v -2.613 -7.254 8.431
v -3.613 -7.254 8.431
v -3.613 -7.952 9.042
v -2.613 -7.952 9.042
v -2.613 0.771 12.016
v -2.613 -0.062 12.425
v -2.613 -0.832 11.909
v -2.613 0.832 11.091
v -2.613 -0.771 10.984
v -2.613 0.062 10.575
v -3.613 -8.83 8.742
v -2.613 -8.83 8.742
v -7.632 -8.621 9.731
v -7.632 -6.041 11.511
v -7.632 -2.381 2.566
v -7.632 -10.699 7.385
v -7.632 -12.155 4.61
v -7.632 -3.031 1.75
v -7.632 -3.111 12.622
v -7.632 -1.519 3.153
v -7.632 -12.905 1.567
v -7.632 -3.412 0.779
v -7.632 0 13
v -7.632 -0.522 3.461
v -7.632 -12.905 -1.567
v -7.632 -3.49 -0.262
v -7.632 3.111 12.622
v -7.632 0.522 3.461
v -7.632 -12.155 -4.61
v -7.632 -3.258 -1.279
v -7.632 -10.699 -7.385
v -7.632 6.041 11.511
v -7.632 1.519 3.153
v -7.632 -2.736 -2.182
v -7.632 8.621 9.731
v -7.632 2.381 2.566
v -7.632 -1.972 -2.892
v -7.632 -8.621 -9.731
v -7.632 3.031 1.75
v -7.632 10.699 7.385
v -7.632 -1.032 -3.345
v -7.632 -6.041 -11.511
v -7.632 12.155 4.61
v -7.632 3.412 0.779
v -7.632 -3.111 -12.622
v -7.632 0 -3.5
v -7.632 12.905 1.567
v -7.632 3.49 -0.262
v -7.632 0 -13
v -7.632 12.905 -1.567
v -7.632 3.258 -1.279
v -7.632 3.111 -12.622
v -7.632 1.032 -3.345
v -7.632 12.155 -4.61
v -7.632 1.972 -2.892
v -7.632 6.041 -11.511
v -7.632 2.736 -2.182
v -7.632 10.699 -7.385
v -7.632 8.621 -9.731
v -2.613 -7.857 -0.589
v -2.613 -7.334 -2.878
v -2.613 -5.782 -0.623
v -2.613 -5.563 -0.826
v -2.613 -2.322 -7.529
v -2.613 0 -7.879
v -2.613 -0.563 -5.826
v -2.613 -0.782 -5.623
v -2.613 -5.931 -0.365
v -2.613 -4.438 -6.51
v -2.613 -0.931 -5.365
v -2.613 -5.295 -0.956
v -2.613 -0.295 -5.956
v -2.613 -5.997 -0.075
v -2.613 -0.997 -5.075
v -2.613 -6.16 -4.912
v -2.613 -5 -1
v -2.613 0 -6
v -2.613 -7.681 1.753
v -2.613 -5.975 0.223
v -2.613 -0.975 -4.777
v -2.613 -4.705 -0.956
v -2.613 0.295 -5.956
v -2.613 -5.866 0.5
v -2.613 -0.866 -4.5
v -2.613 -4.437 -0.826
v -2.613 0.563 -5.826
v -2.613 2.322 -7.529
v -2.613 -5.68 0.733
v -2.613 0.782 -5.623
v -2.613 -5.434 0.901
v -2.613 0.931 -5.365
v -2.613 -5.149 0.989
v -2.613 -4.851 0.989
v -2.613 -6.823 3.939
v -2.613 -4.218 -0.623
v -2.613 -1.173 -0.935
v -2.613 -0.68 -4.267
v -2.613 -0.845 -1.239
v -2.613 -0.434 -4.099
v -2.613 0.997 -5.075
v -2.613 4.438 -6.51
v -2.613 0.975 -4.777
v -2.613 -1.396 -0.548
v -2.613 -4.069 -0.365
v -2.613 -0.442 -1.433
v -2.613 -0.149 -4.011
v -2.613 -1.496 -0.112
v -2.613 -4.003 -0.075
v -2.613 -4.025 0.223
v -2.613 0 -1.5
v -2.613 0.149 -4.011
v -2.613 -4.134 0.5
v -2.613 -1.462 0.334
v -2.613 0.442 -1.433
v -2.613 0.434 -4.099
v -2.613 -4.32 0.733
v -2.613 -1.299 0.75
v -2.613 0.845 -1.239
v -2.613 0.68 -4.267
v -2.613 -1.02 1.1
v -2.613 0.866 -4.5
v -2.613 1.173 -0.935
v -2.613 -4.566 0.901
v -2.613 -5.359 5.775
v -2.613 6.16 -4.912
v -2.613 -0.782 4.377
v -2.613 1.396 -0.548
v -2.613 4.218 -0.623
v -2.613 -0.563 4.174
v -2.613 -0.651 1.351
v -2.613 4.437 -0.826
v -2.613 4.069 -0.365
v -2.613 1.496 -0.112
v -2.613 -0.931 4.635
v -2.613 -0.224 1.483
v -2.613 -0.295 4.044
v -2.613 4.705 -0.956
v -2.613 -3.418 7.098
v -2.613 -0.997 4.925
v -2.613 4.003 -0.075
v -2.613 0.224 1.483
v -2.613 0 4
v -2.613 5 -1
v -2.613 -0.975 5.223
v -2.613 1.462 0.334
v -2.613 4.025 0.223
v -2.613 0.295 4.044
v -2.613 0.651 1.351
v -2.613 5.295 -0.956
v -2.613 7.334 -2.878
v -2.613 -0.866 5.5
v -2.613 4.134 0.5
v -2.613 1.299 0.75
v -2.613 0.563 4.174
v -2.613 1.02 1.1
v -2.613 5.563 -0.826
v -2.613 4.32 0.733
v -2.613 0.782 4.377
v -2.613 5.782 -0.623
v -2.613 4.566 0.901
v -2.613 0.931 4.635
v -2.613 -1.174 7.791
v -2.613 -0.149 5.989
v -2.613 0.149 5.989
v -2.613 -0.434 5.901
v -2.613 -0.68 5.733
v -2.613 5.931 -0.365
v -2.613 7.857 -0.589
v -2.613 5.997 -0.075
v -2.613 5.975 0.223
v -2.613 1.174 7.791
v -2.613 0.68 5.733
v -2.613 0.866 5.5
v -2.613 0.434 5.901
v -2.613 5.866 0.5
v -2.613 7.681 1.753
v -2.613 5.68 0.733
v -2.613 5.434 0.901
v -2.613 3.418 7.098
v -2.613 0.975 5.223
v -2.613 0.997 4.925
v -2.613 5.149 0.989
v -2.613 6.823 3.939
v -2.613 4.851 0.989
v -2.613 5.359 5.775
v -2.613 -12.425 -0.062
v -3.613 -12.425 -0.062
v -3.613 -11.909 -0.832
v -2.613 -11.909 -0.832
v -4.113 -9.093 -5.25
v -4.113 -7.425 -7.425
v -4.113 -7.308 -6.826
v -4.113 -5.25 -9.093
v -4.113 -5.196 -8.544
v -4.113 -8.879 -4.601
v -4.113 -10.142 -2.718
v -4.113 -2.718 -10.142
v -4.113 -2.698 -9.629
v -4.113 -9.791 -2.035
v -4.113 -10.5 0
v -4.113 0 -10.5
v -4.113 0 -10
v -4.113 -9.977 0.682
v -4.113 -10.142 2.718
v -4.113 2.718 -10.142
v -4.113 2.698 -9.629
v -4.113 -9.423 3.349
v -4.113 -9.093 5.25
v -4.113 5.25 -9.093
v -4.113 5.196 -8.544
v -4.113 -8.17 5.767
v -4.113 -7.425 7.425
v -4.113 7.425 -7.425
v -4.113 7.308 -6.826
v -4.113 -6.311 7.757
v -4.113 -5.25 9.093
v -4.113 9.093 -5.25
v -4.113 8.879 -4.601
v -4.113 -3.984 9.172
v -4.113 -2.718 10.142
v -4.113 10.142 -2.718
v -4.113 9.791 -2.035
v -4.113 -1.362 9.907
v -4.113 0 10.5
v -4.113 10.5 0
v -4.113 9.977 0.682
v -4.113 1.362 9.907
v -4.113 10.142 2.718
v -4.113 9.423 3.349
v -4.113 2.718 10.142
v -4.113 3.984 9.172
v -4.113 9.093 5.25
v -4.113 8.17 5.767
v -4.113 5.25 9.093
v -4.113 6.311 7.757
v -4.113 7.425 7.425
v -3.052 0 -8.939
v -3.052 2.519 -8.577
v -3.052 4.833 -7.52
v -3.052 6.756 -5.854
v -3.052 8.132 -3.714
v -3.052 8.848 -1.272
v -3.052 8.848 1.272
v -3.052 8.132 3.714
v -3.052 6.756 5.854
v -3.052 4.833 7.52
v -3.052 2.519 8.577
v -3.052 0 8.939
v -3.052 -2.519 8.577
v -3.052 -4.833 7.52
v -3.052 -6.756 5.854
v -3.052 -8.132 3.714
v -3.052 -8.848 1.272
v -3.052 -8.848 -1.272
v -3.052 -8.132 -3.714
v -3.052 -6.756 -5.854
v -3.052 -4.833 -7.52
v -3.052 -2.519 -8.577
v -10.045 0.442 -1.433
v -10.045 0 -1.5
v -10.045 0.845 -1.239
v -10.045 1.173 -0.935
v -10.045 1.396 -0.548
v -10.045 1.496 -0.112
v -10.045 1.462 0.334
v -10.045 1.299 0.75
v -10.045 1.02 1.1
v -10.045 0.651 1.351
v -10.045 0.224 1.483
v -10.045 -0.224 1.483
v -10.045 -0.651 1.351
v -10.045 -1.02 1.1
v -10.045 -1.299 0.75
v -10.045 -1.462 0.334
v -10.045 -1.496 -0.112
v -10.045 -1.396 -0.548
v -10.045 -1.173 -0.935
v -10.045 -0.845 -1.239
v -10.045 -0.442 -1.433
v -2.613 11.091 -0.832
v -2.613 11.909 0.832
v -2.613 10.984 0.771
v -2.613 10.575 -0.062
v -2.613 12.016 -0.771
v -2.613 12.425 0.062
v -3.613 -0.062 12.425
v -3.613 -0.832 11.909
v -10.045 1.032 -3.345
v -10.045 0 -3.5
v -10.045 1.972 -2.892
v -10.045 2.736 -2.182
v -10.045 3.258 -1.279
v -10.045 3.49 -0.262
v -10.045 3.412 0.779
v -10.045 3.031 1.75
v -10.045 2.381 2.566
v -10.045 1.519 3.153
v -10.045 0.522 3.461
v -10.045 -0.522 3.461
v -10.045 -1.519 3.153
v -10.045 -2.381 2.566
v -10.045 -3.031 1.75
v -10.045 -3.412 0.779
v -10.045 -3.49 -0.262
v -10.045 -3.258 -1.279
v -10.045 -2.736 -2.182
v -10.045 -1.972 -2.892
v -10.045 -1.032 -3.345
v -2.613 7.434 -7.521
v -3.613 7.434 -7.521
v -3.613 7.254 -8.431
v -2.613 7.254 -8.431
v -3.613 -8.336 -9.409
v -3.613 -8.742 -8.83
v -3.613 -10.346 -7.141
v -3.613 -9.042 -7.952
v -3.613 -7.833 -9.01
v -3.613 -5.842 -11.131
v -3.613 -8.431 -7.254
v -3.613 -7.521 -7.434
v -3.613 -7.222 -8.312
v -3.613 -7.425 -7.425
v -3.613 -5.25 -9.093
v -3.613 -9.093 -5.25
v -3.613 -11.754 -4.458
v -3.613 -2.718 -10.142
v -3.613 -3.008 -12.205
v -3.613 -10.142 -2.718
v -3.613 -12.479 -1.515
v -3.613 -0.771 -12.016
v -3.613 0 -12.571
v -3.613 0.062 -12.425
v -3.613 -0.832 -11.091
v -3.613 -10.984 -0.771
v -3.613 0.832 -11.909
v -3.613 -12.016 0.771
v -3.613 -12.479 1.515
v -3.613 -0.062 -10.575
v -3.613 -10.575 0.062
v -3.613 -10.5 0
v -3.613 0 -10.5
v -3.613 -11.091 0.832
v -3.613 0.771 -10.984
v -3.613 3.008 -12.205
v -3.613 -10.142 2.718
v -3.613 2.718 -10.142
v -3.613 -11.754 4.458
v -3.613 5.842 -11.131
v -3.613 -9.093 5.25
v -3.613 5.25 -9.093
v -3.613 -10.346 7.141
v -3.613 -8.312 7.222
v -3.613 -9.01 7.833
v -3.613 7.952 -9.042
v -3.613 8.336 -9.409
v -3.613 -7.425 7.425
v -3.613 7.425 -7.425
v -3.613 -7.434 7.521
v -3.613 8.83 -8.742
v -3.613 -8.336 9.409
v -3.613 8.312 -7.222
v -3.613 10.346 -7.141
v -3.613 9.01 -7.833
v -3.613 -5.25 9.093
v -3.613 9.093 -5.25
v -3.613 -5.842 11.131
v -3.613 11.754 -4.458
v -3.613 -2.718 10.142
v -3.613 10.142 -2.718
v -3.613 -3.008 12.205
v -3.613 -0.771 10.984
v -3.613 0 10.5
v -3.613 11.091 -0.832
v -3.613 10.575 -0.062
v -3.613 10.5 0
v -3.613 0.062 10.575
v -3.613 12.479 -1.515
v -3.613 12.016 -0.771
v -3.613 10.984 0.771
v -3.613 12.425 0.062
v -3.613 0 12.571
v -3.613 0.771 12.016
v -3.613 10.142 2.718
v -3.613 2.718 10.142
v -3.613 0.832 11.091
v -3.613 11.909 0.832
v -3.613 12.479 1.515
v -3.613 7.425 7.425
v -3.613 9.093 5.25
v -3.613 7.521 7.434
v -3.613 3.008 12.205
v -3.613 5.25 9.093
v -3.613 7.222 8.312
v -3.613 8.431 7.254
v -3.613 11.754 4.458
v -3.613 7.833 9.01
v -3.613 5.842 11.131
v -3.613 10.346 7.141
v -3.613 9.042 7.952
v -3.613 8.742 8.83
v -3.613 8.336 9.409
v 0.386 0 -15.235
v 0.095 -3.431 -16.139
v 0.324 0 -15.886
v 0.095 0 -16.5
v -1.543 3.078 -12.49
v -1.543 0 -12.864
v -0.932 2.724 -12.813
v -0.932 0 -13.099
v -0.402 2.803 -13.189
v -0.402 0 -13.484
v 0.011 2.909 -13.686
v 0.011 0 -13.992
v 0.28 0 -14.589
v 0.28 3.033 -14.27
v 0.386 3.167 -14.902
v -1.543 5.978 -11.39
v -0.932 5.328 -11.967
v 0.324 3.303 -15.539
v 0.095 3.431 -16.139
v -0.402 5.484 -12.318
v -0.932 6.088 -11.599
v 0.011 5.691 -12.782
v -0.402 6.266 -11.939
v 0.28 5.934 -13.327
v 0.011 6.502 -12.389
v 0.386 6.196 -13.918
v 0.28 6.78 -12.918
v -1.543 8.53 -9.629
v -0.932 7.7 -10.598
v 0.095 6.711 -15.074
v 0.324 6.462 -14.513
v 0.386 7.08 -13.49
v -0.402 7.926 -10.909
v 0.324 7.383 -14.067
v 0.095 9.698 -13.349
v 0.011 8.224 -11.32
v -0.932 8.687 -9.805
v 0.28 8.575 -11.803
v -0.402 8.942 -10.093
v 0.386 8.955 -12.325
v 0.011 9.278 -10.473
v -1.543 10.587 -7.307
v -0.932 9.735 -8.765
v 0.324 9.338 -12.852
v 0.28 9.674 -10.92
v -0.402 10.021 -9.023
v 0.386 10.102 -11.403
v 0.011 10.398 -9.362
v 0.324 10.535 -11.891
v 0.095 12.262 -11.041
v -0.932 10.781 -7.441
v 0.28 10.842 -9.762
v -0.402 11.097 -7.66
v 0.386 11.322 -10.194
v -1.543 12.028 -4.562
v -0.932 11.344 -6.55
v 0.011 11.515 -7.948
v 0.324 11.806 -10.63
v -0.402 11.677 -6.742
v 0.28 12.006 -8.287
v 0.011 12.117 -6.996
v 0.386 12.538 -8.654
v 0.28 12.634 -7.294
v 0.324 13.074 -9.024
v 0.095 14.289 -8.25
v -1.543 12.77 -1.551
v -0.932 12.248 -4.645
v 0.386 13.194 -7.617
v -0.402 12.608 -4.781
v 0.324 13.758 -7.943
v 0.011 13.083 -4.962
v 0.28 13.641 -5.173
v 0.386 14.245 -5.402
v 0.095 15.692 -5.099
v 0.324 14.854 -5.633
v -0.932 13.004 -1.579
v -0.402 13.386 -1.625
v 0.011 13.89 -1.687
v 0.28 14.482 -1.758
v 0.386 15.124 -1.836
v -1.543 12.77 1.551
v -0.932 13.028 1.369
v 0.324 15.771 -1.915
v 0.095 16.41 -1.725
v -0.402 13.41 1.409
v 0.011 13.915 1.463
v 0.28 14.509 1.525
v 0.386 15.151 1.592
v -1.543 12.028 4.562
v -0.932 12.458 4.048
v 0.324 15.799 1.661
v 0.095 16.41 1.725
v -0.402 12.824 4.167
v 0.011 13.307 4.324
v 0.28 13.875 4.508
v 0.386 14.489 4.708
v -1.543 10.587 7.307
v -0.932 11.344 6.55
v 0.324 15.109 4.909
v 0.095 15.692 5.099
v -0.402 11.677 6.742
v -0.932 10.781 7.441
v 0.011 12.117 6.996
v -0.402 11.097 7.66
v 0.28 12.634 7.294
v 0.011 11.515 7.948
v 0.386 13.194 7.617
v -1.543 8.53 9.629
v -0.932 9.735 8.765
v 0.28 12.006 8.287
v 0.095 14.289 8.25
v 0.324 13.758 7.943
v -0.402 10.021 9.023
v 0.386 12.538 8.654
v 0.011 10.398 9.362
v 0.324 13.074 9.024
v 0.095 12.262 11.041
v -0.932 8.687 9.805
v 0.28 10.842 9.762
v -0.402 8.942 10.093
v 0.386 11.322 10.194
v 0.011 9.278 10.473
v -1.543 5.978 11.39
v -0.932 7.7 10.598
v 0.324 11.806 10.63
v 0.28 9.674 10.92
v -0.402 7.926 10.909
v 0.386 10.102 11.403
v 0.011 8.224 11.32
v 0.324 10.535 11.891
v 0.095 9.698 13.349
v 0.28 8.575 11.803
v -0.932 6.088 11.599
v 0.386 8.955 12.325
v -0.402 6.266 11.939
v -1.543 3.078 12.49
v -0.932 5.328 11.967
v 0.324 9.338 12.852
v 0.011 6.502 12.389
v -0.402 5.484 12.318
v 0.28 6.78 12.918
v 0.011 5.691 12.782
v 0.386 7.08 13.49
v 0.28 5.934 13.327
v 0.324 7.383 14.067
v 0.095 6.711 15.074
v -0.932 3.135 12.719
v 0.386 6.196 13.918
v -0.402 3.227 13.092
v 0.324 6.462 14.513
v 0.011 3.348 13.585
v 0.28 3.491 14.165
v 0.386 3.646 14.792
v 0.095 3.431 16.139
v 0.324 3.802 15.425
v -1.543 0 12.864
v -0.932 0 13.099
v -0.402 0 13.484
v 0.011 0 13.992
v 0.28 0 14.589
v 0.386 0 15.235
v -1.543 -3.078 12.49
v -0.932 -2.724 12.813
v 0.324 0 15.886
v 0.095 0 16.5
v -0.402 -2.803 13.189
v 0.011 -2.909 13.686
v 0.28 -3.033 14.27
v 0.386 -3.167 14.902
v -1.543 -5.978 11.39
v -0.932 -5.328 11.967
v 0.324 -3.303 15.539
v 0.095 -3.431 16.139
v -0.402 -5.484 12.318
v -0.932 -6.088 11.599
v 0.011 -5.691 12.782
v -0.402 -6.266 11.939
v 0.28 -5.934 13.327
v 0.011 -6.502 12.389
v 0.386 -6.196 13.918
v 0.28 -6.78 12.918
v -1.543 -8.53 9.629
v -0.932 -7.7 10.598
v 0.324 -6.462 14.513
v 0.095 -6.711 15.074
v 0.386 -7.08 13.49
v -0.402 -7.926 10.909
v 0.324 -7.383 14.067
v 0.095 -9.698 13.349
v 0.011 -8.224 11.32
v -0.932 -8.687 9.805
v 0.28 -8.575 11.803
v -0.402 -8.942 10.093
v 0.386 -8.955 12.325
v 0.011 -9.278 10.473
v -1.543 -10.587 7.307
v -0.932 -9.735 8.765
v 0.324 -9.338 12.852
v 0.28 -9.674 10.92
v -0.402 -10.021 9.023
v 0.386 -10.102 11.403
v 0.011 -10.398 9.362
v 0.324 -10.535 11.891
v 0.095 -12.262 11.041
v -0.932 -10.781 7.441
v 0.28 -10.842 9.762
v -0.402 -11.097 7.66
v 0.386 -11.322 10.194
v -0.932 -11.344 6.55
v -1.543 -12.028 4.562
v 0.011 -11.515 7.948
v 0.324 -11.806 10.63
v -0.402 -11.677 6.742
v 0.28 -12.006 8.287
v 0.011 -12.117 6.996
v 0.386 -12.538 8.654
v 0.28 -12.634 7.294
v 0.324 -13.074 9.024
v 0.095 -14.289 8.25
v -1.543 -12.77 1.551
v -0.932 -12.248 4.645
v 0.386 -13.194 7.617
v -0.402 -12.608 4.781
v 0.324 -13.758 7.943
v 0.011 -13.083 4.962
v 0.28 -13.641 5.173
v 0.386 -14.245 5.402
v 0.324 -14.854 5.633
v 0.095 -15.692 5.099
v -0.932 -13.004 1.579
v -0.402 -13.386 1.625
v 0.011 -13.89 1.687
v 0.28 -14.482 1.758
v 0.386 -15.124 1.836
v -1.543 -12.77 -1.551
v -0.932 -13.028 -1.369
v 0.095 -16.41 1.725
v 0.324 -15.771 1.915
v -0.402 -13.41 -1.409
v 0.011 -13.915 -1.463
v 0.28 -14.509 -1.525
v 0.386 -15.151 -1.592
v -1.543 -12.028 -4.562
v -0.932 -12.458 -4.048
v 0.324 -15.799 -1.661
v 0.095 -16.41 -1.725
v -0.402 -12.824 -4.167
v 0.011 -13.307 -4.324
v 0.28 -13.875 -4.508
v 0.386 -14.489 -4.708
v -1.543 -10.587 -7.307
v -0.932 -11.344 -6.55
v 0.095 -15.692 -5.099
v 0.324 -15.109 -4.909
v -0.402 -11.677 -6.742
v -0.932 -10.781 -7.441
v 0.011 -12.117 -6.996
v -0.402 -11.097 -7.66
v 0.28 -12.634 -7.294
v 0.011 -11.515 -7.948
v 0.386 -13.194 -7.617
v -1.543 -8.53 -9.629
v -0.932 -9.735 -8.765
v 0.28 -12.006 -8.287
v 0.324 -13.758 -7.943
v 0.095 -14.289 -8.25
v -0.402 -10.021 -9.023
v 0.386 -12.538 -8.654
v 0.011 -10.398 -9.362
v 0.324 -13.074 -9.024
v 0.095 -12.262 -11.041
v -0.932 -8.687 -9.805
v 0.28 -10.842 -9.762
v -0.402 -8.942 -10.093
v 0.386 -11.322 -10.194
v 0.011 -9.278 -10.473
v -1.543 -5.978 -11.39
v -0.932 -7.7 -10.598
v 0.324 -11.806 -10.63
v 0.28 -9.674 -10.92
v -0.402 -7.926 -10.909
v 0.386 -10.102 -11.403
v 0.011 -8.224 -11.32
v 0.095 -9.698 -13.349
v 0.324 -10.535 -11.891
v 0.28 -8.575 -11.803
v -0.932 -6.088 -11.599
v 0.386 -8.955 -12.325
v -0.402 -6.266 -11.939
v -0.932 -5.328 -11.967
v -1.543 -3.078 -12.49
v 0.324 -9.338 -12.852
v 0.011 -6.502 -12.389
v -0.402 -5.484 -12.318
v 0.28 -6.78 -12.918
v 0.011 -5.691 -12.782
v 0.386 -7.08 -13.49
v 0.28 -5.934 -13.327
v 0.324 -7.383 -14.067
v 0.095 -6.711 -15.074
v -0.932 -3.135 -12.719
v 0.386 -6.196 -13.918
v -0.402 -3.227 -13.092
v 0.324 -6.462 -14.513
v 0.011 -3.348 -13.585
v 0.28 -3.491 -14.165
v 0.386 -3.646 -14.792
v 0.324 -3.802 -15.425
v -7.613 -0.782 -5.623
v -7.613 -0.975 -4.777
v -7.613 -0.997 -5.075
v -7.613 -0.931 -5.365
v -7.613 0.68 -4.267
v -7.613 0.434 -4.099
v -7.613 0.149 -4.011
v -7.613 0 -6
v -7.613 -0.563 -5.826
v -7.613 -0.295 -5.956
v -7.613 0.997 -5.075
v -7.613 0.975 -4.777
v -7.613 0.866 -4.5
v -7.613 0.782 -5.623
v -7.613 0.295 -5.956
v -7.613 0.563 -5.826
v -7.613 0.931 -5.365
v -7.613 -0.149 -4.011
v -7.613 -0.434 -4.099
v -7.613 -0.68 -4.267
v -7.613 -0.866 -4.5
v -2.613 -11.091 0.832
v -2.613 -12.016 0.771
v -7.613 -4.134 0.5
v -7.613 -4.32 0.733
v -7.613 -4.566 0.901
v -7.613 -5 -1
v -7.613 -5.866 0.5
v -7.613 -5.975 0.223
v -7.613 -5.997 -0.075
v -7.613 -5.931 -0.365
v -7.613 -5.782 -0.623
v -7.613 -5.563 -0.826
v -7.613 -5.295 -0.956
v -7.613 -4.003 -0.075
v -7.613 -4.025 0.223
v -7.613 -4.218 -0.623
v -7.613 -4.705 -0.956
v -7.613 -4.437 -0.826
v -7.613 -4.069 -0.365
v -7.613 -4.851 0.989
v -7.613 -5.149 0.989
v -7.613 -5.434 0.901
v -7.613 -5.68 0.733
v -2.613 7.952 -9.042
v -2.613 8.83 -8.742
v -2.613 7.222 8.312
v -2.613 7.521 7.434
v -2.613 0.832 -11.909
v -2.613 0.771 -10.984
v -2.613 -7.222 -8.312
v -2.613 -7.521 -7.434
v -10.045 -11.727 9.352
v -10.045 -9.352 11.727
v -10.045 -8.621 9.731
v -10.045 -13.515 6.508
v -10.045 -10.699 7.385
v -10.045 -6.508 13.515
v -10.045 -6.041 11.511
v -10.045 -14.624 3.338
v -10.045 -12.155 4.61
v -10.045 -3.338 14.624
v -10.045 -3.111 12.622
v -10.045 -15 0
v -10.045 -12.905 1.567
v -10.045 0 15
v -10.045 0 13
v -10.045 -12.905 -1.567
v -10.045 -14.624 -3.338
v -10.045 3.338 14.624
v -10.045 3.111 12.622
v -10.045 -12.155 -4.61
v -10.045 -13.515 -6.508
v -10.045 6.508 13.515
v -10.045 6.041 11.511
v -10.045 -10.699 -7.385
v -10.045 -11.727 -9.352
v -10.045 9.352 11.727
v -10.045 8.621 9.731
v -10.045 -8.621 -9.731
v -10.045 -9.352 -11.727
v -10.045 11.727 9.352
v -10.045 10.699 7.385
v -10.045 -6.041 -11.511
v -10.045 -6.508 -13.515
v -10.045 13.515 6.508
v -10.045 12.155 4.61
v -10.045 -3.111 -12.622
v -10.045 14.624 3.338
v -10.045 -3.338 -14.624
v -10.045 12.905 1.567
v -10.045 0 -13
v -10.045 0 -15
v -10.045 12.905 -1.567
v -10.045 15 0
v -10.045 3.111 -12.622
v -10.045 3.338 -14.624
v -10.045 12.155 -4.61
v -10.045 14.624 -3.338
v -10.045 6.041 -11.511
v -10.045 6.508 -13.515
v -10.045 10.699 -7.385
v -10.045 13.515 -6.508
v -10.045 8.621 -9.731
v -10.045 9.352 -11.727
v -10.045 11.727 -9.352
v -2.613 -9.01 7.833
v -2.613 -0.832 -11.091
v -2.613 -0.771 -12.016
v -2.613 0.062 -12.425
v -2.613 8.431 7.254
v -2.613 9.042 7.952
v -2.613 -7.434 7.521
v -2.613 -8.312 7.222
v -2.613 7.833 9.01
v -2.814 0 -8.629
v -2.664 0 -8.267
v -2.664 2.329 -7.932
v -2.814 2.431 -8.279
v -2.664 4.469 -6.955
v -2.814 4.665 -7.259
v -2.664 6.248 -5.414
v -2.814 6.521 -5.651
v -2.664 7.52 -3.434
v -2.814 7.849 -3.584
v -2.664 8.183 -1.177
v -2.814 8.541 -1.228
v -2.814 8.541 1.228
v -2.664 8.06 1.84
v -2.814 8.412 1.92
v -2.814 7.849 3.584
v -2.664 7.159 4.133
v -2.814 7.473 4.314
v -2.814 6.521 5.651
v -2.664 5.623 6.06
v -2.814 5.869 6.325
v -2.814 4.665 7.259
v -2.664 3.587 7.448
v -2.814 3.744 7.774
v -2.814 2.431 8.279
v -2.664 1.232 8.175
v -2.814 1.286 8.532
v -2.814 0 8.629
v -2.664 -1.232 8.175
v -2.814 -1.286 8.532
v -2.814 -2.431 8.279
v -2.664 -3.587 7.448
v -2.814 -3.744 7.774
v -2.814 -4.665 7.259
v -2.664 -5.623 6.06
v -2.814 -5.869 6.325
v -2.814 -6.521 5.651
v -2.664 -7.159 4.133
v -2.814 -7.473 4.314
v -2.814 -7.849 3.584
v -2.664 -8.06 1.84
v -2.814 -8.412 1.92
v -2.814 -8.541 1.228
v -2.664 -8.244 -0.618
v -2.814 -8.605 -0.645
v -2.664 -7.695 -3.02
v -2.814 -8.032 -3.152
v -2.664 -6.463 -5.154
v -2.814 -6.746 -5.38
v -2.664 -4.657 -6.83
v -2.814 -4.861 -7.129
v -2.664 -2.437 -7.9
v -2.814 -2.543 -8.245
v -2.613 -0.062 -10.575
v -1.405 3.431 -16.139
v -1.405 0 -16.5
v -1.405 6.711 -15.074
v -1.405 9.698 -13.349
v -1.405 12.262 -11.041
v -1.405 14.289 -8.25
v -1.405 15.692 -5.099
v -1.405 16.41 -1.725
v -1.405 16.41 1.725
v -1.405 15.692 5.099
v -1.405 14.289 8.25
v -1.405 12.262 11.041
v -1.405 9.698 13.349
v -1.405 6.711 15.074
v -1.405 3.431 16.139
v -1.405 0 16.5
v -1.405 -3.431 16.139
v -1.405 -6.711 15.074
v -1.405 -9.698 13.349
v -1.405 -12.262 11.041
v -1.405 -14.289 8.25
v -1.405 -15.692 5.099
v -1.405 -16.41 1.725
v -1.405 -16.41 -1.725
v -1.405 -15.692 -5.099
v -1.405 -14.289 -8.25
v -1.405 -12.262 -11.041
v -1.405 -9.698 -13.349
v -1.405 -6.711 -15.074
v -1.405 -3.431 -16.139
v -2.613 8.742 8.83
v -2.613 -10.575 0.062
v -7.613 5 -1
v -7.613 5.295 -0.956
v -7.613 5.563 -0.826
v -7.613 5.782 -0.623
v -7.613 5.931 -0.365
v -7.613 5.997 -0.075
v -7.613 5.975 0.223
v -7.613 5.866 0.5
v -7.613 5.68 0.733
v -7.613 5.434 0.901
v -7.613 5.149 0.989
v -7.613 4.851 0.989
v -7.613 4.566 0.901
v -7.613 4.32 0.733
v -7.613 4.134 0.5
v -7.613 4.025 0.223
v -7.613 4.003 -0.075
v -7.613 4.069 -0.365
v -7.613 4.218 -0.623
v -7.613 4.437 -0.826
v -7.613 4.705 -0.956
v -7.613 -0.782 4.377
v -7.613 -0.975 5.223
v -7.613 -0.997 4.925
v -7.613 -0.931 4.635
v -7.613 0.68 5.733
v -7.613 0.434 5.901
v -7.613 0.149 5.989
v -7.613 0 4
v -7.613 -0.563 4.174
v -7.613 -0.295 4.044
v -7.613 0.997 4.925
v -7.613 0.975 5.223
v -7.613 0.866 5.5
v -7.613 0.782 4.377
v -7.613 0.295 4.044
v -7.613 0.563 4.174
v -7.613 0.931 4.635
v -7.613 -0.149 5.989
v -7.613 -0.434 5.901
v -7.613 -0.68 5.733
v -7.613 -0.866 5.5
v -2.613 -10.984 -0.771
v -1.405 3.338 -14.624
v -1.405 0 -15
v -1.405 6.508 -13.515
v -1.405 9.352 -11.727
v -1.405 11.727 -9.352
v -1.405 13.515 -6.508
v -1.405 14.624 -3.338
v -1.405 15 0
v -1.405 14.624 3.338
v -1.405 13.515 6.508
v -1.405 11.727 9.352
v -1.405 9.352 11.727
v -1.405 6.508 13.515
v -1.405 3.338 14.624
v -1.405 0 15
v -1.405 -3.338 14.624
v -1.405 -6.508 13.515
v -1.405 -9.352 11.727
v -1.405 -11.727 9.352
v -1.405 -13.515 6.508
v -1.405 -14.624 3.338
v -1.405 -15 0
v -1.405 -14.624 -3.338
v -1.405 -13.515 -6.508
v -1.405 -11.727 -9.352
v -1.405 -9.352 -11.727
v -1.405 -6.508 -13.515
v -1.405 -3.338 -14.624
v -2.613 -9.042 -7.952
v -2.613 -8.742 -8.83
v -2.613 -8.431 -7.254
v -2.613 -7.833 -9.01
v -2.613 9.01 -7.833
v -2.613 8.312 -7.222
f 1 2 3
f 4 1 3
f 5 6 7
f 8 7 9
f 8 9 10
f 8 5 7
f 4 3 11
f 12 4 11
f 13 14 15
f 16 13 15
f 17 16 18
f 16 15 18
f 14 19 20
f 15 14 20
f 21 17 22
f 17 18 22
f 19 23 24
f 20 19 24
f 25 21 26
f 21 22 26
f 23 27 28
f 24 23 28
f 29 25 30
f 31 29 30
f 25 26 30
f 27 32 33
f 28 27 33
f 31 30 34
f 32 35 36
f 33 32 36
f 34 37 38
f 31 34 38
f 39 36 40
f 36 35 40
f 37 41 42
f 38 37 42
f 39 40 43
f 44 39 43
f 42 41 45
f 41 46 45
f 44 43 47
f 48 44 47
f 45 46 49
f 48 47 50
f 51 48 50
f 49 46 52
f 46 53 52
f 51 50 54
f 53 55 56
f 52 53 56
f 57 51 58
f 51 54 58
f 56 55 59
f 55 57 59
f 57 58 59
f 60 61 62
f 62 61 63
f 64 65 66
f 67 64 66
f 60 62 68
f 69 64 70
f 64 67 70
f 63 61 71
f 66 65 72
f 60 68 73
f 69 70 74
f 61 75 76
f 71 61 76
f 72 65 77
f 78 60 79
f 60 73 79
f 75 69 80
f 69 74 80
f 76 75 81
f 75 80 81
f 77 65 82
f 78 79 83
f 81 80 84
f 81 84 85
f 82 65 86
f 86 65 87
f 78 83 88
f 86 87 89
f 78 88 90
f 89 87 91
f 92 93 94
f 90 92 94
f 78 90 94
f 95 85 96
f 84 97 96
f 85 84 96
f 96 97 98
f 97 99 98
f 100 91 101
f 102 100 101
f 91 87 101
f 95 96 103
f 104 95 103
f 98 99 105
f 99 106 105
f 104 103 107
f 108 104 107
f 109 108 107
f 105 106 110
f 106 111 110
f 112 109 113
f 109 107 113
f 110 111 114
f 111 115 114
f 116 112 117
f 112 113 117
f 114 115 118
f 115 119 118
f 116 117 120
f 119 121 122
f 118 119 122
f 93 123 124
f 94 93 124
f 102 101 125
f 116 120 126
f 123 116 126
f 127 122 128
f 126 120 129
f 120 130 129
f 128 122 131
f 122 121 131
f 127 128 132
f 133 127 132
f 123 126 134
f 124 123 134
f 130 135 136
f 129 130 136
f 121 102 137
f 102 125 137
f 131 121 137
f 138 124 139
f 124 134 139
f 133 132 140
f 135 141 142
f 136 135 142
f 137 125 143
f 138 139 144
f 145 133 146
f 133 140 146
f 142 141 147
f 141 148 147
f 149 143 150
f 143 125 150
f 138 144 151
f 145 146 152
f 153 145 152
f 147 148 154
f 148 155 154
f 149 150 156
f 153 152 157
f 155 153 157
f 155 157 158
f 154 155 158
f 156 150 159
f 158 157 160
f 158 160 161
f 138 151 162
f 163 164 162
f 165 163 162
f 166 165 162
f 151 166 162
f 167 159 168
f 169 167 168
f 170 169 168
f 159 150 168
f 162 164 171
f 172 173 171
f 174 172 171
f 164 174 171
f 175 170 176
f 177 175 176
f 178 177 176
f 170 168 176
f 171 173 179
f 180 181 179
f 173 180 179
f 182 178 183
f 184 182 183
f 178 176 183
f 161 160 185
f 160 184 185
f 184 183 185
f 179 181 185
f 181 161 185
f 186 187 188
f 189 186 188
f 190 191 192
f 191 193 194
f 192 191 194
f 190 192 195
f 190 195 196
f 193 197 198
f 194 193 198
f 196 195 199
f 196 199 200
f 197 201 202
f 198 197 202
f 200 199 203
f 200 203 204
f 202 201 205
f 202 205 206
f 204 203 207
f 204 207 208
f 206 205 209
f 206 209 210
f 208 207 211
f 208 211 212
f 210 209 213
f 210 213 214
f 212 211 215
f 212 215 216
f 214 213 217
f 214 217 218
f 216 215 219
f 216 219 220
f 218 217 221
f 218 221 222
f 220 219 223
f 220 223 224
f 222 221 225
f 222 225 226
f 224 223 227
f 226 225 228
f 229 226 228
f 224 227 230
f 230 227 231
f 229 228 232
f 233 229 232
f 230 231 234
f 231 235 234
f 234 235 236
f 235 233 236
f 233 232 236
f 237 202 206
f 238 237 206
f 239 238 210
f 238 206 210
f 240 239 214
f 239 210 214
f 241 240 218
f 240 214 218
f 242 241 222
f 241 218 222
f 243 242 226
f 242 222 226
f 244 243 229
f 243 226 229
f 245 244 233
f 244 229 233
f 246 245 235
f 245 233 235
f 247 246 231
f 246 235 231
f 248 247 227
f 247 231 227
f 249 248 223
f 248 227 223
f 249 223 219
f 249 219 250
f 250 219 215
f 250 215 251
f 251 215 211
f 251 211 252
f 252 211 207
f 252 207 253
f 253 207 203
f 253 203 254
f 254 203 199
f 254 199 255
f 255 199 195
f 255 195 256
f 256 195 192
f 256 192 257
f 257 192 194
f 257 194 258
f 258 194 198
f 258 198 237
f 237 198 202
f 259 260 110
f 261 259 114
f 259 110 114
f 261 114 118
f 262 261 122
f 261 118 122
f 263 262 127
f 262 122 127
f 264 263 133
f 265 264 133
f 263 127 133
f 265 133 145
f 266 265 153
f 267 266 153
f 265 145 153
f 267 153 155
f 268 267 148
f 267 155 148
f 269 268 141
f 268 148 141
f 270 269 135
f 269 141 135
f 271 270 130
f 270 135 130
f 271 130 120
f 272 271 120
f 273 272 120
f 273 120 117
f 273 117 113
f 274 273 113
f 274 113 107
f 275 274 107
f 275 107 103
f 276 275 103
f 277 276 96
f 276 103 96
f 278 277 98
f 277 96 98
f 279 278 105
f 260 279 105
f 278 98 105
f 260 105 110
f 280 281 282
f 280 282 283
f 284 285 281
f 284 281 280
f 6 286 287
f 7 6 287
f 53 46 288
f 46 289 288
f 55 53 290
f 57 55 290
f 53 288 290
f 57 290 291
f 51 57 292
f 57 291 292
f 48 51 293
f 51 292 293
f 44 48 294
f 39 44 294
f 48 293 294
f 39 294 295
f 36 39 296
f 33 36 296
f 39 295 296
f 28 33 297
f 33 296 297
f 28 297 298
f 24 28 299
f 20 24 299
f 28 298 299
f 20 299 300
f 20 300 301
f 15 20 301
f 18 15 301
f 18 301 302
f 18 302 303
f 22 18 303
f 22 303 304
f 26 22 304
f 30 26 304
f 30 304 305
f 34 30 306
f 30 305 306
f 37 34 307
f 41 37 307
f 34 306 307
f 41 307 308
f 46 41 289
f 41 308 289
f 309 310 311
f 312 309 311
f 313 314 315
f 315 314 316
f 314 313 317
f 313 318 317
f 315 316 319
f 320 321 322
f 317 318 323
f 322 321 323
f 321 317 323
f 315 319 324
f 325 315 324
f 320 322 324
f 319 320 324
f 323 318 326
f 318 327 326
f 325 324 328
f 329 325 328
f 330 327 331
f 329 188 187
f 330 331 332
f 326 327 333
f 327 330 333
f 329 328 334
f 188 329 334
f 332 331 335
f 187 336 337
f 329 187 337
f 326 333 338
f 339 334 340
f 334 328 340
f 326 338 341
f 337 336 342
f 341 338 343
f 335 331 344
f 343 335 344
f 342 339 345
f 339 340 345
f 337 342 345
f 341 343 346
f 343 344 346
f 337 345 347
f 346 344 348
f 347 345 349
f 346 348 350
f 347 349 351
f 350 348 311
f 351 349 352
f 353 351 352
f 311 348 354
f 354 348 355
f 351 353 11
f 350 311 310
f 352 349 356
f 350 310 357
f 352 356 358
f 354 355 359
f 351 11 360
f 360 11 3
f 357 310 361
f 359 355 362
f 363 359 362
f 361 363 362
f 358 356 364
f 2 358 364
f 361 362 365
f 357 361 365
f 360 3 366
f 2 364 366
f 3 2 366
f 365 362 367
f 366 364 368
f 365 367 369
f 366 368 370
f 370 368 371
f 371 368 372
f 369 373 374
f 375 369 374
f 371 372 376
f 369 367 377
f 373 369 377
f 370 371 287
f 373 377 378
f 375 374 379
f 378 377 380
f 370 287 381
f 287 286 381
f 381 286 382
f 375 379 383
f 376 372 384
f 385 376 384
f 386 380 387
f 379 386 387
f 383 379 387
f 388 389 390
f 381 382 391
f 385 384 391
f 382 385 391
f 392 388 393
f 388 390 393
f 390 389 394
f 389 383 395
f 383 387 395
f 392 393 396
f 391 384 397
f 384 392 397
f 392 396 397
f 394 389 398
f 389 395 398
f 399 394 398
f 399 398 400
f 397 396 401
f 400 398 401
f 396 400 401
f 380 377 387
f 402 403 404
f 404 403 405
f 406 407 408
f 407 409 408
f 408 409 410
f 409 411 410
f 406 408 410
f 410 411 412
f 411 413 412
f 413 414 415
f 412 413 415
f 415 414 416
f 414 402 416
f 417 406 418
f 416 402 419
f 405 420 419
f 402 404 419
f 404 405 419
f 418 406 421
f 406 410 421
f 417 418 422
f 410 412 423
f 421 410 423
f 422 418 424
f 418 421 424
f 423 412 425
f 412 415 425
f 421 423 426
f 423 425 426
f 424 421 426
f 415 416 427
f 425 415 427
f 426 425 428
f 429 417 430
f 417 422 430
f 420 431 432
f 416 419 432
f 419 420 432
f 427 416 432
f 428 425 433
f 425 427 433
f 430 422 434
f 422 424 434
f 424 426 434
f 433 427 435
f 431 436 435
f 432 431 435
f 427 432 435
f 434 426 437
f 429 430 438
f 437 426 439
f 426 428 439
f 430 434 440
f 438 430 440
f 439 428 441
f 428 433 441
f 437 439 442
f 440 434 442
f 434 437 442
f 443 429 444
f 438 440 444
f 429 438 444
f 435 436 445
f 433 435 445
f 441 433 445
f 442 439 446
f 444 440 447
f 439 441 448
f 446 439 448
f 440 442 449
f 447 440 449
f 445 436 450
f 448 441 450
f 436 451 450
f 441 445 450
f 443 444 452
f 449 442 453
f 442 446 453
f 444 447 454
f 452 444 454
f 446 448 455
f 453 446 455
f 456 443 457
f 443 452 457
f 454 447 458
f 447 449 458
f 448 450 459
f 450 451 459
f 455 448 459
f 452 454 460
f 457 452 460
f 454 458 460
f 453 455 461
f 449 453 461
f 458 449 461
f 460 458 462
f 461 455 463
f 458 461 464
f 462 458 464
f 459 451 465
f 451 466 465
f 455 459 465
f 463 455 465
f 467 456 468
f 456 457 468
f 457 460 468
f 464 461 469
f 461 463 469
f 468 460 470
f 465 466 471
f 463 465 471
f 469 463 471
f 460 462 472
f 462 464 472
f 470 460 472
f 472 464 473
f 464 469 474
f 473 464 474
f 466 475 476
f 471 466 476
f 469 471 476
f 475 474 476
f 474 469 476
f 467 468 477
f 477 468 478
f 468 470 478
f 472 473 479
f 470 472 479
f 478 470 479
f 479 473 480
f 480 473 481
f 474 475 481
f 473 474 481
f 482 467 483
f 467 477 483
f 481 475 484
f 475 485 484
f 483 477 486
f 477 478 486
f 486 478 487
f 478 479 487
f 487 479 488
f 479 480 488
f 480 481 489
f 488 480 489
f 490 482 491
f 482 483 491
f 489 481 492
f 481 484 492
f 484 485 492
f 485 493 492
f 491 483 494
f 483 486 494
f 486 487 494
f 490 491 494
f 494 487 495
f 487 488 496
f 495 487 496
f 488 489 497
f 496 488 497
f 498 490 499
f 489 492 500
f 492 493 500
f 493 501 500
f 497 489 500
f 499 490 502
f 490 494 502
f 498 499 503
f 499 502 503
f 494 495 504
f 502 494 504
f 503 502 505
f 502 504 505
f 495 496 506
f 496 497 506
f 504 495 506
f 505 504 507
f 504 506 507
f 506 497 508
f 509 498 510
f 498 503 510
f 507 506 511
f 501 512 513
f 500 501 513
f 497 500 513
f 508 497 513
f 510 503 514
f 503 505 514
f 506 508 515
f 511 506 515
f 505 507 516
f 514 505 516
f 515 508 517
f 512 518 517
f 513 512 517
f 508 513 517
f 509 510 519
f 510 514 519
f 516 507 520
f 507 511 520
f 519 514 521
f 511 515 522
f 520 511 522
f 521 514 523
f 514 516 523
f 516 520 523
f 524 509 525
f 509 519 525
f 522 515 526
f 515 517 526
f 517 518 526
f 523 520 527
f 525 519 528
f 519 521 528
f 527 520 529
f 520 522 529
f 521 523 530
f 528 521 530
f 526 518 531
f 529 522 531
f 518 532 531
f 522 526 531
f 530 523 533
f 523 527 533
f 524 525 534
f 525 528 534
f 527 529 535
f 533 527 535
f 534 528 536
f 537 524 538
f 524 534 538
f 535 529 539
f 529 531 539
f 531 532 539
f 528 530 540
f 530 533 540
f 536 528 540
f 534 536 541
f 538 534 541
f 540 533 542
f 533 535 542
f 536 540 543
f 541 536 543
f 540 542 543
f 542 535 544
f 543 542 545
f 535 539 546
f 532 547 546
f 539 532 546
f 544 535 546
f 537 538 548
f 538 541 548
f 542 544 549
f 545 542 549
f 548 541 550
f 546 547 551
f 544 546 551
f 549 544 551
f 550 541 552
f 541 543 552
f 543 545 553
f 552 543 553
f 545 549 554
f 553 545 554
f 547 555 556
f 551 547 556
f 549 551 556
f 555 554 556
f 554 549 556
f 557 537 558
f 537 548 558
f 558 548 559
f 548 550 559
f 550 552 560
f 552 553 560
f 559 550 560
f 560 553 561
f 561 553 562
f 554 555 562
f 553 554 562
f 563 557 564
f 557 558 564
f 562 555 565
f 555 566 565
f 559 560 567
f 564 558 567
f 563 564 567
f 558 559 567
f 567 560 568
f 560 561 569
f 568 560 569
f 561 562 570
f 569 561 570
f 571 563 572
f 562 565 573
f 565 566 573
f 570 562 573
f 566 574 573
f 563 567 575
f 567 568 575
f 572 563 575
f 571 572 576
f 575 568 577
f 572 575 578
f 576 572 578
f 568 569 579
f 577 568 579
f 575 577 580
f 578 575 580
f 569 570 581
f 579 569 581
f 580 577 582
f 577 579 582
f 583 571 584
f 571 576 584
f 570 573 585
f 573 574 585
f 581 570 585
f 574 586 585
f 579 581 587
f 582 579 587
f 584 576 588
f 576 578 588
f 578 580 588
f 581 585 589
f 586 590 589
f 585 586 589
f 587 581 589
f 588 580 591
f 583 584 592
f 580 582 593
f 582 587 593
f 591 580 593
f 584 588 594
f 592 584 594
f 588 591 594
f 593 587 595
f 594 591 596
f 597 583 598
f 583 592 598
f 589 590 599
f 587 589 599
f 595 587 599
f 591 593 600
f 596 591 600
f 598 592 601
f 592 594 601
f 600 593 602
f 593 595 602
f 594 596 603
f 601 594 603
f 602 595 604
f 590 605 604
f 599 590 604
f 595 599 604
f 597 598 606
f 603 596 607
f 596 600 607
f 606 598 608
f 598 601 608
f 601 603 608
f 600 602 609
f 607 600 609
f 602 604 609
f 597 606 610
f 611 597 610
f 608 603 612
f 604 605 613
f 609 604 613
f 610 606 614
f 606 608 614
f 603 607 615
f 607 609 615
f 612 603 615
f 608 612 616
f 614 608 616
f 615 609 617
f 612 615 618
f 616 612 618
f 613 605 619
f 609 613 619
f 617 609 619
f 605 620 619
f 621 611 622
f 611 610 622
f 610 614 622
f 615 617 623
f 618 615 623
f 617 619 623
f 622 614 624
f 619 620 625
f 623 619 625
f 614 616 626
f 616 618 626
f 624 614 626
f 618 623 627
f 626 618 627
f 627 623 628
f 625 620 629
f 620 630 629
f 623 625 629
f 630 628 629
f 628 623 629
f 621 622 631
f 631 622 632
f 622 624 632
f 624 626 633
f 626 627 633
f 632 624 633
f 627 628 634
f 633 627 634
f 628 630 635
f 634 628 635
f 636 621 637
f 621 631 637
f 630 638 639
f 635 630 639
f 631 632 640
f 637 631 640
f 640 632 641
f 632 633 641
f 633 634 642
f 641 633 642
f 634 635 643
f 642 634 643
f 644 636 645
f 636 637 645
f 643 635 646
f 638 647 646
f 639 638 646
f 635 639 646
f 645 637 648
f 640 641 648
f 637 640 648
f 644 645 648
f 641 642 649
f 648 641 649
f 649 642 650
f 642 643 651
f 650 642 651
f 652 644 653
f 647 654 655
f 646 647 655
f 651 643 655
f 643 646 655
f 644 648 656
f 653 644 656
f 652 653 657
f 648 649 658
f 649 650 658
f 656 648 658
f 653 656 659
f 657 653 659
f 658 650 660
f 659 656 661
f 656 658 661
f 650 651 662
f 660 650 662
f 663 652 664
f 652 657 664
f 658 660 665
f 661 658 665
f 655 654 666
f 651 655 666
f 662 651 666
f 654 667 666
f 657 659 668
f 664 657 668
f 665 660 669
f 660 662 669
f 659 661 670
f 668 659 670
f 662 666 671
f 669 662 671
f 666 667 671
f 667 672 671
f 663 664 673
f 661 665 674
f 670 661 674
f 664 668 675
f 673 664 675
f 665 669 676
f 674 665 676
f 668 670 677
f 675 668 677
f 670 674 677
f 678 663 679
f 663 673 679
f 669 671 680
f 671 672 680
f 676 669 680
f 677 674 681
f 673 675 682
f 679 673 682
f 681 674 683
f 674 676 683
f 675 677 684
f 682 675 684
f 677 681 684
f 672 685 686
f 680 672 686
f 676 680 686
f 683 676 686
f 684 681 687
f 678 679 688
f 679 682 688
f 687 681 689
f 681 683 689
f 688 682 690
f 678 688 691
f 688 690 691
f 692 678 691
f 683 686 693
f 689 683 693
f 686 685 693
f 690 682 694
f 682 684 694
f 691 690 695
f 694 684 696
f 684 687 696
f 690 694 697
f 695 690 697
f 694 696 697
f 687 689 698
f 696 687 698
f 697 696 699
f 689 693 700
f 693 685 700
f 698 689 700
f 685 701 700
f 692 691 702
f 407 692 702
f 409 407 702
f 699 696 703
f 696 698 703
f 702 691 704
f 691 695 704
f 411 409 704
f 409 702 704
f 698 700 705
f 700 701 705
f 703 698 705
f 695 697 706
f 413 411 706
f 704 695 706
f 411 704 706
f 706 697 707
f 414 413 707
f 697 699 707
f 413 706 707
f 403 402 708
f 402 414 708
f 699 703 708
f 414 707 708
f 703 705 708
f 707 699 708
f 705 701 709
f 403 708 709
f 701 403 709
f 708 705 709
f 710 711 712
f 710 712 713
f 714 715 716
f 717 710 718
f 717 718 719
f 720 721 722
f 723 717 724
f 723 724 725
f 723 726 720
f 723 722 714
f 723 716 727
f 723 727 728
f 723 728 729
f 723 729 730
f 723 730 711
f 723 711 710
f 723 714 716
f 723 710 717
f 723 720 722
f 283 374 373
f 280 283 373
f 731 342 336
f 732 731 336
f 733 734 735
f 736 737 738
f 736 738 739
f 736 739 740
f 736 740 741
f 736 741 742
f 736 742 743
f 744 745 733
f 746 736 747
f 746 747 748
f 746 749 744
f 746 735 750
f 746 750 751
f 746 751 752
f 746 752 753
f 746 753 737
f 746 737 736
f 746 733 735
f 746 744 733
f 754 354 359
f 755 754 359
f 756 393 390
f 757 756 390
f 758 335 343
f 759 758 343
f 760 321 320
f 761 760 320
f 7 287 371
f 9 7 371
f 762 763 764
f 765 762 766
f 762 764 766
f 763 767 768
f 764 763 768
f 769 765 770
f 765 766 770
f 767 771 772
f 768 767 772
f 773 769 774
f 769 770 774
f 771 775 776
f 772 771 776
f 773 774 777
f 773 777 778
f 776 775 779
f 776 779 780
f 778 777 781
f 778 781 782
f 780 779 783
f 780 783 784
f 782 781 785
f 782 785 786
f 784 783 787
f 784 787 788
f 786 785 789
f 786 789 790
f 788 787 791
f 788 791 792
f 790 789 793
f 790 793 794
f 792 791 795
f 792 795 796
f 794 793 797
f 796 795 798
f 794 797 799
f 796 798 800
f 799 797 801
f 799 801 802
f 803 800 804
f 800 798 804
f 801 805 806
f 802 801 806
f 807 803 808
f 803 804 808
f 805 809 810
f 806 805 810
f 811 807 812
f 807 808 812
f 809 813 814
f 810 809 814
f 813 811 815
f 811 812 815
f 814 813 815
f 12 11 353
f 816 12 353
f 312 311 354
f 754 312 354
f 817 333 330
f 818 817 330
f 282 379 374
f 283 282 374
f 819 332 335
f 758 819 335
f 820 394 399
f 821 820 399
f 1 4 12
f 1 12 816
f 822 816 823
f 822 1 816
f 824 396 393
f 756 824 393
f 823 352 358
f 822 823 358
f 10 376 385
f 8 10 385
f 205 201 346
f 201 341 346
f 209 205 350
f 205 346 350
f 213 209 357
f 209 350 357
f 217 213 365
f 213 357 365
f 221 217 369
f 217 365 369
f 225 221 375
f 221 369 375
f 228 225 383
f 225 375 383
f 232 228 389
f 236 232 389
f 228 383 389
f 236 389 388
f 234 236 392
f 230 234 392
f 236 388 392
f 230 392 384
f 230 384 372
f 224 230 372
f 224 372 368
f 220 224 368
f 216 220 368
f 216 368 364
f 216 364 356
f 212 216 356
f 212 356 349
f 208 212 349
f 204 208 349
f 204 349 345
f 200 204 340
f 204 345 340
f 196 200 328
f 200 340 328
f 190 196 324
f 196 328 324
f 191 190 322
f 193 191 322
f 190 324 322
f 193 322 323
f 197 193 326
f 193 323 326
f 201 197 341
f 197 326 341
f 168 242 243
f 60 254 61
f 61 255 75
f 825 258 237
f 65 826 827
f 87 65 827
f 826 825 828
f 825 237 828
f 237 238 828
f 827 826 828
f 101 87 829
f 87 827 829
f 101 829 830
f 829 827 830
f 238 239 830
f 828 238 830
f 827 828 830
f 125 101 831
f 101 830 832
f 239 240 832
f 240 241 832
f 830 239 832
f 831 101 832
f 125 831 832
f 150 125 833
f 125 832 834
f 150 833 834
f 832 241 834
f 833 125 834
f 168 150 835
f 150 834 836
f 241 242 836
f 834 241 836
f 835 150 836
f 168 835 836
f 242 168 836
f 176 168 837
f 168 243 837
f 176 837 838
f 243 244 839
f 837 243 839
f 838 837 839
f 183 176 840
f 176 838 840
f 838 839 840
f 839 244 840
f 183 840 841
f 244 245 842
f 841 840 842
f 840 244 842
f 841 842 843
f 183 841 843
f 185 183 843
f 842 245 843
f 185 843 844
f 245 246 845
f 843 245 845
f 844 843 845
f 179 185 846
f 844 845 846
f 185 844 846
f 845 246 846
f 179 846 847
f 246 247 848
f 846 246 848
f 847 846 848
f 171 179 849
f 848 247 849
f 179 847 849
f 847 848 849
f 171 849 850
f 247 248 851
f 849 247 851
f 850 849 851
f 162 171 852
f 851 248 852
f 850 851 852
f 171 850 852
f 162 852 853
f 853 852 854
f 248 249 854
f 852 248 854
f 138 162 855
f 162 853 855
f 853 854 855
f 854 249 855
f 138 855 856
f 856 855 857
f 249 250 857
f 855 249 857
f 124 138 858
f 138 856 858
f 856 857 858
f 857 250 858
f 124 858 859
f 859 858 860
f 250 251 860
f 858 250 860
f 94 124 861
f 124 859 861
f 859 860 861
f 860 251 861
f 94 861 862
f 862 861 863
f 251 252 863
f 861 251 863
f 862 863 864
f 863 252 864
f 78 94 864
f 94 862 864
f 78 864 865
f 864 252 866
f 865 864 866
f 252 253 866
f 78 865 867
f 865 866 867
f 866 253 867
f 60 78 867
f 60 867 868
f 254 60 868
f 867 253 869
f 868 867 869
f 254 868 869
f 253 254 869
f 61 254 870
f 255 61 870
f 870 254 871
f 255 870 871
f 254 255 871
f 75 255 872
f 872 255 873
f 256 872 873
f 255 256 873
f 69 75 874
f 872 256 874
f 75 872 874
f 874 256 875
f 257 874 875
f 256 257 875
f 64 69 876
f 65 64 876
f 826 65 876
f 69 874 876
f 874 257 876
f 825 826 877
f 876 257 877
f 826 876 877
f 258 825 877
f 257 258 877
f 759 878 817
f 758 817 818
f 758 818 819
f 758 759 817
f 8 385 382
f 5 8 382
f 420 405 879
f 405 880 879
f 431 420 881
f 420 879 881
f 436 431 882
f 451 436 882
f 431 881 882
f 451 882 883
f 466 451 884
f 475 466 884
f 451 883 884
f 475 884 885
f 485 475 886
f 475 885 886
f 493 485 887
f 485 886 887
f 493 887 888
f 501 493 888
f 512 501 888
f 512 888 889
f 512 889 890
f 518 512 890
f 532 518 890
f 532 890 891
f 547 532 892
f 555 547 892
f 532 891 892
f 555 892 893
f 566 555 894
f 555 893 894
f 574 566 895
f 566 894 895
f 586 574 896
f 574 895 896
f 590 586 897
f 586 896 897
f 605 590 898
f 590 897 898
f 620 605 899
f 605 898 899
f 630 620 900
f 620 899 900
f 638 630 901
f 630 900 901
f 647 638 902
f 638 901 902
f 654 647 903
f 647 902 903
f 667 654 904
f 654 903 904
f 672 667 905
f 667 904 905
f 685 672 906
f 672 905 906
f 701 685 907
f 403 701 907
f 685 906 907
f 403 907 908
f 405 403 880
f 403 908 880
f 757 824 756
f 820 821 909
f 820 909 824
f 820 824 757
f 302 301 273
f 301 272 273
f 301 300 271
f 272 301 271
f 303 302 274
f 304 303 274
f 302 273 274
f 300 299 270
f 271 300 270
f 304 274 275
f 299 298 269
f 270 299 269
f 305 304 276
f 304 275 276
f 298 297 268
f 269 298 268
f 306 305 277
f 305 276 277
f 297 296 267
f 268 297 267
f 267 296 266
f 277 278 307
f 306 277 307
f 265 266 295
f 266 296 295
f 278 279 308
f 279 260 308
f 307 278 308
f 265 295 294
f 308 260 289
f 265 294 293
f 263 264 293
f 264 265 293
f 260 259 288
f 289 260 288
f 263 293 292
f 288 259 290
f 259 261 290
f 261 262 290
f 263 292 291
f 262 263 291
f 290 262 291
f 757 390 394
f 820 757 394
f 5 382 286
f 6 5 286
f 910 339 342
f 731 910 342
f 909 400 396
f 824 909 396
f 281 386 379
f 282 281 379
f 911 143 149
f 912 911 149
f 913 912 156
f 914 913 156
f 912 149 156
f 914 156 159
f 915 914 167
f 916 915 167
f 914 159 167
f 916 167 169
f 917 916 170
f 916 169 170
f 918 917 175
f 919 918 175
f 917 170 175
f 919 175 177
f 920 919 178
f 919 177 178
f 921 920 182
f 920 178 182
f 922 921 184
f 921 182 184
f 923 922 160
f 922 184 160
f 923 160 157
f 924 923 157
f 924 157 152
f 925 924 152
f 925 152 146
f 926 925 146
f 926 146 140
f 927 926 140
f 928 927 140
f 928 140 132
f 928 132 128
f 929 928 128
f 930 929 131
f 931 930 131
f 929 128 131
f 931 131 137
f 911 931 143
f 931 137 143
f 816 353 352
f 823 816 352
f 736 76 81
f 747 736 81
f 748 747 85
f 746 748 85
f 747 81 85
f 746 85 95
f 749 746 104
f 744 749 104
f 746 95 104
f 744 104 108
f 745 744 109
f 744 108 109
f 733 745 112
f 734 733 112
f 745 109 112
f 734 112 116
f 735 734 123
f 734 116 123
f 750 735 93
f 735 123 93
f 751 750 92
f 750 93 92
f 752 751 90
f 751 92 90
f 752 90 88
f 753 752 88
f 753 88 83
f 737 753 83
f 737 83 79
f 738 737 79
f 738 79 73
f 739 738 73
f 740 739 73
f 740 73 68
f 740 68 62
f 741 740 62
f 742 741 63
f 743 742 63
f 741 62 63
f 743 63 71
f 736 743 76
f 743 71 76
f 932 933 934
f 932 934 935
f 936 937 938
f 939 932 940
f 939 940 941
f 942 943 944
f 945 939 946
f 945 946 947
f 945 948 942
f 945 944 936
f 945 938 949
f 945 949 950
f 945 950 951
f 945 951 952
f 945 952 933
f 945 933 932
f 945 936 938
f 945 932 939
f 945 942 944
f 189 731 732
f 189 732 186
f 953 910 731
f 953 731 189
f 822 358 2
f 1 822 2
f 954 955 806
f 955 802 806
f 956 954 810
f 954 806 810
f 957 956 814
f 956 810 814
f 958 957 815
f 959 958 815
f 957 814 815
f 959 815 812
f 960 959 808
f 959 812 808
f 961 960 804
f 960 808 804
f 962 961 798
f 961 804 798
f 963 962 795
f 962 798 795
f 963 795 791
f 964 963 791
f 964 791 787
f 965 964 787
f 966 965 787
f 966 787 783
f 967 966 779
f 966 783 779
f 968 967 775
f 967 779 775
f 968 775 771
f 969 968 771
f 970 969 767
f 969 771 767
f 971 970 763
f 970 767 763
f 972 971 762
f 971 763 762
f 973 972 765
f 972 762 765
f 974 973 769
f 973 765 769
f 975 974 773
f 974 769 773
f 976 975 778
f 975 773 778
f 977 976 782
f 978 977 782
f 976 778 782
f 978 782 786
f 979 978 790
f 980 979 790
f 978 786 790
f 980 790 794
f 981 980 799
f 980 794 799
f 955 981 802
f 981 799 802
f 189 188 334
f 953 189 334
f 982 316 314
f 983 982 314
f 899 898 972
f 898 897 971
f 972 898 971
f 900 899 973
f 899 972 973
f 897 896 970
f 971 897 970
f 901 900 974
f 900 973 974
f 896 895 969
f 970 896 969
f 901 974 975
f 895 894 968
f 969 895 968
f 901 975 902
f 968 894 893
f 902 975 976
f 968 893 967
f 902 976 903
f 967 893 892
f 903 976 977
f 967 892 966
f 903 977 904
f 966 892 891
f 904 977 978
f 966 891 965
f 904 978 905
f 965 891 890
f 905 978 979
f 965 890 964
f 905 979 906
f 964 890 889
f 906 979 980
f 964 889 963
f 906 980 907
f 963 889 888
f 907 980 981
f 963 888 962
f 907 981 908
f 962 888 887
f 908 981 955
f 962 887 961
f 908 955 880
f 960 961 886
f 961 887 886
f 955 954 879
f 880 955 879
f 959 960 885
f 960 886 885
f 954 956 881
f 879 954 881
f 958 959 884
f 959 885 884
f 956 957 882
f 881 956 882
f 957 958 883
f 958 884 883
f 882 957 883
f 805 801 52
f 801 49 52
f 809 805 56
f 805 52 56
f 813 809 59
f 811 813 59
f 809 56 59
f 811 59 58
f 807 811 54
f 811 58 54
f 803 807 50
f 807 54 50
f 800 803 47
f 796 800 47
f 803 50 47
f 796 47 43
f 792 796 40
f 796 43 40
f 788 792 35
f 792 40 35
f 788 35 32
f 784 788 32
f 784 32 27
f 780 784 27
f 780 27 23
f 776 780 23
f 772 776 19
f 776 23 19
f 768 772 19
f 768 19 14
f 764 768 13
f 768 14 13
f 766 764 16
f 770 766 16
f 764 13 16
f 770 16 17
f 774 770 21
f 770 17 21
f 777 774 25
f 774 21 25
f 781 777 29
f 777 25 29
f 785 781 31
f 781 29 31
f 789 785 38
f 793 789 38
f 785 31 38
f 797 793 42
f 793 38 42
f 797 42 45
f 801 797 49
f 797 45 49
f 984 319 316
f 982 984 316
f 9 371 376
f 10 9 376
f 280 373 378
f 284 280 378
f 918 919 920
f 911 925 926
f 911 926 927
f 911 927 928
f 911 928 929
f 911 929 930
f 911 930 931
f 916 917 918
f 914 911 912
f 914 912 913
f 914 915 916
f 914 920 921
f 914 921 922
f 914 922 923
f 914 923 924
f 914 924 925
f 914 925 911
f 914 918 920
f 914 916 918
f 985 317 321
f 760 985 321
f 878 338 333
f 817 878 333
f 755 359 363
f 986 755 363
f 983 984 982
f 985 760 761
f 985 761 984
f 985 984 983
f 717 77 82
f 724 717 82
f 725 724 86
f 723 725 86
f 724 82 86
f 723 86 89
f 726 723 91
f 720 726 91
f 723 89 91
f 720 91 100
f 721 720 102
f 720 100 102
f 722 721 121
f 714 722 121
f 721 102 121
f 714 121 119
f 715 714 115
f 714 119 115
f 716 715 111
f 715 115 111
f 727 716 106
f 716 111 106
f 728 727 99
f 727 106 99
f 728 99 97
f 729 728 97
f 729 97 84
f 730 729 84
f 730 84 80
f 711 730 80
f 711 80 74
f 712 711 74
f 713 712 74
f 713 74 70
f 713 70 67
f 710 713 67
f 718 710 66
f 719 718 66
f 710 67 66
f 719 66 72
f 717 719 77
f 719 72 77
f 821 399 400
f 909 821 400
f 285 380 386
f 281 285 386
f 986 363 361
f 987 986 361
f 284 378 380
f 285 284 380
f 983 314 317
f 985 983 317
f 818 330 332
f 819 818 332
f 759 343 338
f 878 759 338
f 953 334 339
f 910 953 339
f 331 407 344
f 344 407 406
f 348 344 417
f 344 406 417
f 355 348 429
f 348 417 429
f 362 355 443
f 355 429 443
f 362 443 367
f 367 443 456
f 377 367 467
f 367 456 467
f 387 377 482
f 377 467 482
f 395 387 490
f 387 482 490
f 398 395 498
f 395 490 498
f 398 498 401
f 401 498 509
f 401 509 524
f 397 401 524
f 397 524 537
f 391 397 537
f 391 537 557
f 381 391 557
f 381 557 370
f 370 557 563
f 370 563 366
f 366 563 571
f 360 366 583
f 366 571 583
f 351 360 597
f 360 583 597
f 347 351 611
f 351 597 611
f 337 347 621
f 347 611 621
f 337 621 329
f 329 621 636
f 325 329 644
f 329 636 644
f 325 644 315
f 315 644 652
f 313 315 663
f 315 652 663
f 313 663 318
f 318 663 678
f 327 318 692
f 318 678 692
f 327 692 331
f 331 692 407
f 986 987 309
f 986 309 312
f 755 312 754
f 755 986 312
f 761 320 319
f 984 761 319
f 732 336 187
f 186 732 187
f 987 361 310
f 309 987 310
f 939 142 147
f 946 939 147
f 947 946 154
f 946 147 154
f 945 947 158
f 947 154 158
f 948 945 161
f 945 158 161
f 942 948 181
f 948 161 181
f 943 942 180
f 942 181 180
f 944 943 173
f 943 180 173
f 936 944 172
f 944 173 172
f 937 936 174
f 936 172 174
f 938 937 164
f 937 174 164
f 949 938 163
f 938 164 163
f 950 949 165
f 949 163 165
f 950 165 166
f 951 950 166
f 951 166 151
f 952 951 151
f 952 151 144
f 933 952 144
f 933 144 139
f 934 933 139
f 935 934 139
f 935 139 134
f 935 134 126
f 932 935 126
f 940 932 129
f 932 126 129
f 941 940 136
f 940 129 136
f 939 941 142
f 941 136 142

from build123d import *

# Parameters (mm, degrees)
FILLET1_R           = 1.5
SKETCH2_R           = 1
CUT_EXTRUDE1_DEPTH  = 5
BOSS_EXTRUDE1_DEPTH = 1


with BuildPart() as part:
    # Sketch1 → Revolve1 (revolve)
    with BuildSketch(Plane(origin=(0, 0, 0), x_dir=(1, 0, 0), z_dir=(0, 1, 0))):
        with BuildLine():
            Line((0.095371477, 16.5), (-1.404628523, 16.5))
            Line((-1.404628523, 16.5), (-1.404628523, 15))
            Line((-1.404628523, 15), (-10.044628523, 15))
            Line((-10.044628523, 15), (-10.044628523, 13))
            Line((-10.044628523, 13), (-7.631517886, 13))
            Line((-7.631517886, 13), (-7.631517886, 3.5))
            Line((-7.631517886, 3.5), (-10.044628523, 3.5))
            Line((-10.044628523, 3.5), (-10.044628523, 1.5))
            Line((-10.044628523, 1.5), (-7.631517886, 1.5))
            Line((-7.631517886, 1.5), (-2.613091993, 1.5))
            Line((-2.613091993, 1.5), (-2.613091993, 8.5))
            Line((-2.613091993, 8.5), (-4.113091993, 10))
            Line((-4.113091993, 10), (-4.113091993, 10.5))
            Line((-4.113091993, 10.5), (-3.613091993, 10.5))
            Line((-3.613091993, 10.5), (-3.613091993, 12.570770776))
            Line((-3.613091993, 12.570770776), (-1.543093741, 12.863761539))
            ThreePointArc((-1.543093741, 12.863761539), (0.164689844, 14.281505523), (0.095371477, 16.5))
        make_face()
    revolve(axis=Axis((-25, 0, 0), (1, 0, 0)))

    # Fillet1
    fillet1_edges = [part.edges().sort_by_distance(p)[0] for p in [
        (-2.613091993, 0, 8.5),
    ]]
    fillet(fillet1_edges, radius=FILLET1_R)

    # Sketch2 → Cut-Extrude1 (cut, symmetric)
    with BuildSketch(Plane(origin=(-2.613091993, 0, 0), x_dir=(0, 0, -1), z_dir=(1, 0, 0))):
        with Locations((0, 5)):
            Circle(SKETCH2_R)
        with Locations((5, 0)):
            Circle(SKETCH2_R)
        with Locations((0, -5)):
            Circle(SKETCH2_R)
        with Locations((-5, 0)):
            Circle(SKETCH2_R)
    extrude(amount=CUT_EXTRUDE1_DEPTH, both=True, mode=Mode.SUBTRACT)

    # Sketch3 → Boss-Extrude1 (add)
    with BuildSketch(Plane(origin=(-3.613091993, 0, 0), x_dir=(0, 0, -1), z_dir=(1, 0, 0))):
        Polygon((8.43091754, 7.253822764), (9.041610985, 7.95188113), (8.742421428, 8.82978635), (7.832538427, 9.009633204), (7.221844982, 8.311574837), (7.521034539, 7.433669617), align=None)
        Polygon((0.832331699, 11.09078623), (0.77055537, 12.016213511), (-0.061776329, 12.425427281), (-0.832331699, 11.90921377), (-0.77055537, 10.983786489), (0.061776329, 10.574572719), align=None)
        Polygon((11.09078623, -0.832331699), (12.016213511, -0.77055537), (12.425427281, 0.061776329), (11.90921377, 0.832331699), (10.983786489, 0.77055537), (10.574572719, -0.061776329), align=None)
        Polygon((7.253822764, -8.43091754), (7.95188113, -9.041610985), (8.82978635, -8.742421428), (9.009633204, -7.832538427), (8.311574837, -7.221844982), (7.433669617, -7.521034539), align=None)
        Polygon((-0.832331699, -11.09078623), (-0.77055537, -12.016213511), (0.061776329, -12.425427281), (0.832331699, -11.90921377), (0.77055537, -10.983786489), (-0.061776329, -10.574572719), align=None)
        Polygon((-8.43091754, -7.253822764), (-9.041610985, -7.95188113), (-8.742421428, -8.82978635), (-7.832538427, -9.009633204), (-7.221844982, -8.311574837), (-7.521034539, -7.433669617), align=None)
        Polygon((-11.09078623, 0.832331699), (-12.016213511, 0.77055537), (-12.425427281, -0.061776329), (-11.90921377, -0.832331699), (-10.983786489, -0.77055537), (-10.574572719, 0.061776329), align=None)
        Polygon((-7.253822764, 8.43091754), (-7.95188113, 9.041610985), (-8.82978635, 8.742421428), (-9.009633204, 7.832538427), (-8.311574837, 7.221844982), (-7.433669617, 7.521034539), align=None)
    extrude(amount=BOSS_EXTRUDE1_DEPTH)


solid = part.part
